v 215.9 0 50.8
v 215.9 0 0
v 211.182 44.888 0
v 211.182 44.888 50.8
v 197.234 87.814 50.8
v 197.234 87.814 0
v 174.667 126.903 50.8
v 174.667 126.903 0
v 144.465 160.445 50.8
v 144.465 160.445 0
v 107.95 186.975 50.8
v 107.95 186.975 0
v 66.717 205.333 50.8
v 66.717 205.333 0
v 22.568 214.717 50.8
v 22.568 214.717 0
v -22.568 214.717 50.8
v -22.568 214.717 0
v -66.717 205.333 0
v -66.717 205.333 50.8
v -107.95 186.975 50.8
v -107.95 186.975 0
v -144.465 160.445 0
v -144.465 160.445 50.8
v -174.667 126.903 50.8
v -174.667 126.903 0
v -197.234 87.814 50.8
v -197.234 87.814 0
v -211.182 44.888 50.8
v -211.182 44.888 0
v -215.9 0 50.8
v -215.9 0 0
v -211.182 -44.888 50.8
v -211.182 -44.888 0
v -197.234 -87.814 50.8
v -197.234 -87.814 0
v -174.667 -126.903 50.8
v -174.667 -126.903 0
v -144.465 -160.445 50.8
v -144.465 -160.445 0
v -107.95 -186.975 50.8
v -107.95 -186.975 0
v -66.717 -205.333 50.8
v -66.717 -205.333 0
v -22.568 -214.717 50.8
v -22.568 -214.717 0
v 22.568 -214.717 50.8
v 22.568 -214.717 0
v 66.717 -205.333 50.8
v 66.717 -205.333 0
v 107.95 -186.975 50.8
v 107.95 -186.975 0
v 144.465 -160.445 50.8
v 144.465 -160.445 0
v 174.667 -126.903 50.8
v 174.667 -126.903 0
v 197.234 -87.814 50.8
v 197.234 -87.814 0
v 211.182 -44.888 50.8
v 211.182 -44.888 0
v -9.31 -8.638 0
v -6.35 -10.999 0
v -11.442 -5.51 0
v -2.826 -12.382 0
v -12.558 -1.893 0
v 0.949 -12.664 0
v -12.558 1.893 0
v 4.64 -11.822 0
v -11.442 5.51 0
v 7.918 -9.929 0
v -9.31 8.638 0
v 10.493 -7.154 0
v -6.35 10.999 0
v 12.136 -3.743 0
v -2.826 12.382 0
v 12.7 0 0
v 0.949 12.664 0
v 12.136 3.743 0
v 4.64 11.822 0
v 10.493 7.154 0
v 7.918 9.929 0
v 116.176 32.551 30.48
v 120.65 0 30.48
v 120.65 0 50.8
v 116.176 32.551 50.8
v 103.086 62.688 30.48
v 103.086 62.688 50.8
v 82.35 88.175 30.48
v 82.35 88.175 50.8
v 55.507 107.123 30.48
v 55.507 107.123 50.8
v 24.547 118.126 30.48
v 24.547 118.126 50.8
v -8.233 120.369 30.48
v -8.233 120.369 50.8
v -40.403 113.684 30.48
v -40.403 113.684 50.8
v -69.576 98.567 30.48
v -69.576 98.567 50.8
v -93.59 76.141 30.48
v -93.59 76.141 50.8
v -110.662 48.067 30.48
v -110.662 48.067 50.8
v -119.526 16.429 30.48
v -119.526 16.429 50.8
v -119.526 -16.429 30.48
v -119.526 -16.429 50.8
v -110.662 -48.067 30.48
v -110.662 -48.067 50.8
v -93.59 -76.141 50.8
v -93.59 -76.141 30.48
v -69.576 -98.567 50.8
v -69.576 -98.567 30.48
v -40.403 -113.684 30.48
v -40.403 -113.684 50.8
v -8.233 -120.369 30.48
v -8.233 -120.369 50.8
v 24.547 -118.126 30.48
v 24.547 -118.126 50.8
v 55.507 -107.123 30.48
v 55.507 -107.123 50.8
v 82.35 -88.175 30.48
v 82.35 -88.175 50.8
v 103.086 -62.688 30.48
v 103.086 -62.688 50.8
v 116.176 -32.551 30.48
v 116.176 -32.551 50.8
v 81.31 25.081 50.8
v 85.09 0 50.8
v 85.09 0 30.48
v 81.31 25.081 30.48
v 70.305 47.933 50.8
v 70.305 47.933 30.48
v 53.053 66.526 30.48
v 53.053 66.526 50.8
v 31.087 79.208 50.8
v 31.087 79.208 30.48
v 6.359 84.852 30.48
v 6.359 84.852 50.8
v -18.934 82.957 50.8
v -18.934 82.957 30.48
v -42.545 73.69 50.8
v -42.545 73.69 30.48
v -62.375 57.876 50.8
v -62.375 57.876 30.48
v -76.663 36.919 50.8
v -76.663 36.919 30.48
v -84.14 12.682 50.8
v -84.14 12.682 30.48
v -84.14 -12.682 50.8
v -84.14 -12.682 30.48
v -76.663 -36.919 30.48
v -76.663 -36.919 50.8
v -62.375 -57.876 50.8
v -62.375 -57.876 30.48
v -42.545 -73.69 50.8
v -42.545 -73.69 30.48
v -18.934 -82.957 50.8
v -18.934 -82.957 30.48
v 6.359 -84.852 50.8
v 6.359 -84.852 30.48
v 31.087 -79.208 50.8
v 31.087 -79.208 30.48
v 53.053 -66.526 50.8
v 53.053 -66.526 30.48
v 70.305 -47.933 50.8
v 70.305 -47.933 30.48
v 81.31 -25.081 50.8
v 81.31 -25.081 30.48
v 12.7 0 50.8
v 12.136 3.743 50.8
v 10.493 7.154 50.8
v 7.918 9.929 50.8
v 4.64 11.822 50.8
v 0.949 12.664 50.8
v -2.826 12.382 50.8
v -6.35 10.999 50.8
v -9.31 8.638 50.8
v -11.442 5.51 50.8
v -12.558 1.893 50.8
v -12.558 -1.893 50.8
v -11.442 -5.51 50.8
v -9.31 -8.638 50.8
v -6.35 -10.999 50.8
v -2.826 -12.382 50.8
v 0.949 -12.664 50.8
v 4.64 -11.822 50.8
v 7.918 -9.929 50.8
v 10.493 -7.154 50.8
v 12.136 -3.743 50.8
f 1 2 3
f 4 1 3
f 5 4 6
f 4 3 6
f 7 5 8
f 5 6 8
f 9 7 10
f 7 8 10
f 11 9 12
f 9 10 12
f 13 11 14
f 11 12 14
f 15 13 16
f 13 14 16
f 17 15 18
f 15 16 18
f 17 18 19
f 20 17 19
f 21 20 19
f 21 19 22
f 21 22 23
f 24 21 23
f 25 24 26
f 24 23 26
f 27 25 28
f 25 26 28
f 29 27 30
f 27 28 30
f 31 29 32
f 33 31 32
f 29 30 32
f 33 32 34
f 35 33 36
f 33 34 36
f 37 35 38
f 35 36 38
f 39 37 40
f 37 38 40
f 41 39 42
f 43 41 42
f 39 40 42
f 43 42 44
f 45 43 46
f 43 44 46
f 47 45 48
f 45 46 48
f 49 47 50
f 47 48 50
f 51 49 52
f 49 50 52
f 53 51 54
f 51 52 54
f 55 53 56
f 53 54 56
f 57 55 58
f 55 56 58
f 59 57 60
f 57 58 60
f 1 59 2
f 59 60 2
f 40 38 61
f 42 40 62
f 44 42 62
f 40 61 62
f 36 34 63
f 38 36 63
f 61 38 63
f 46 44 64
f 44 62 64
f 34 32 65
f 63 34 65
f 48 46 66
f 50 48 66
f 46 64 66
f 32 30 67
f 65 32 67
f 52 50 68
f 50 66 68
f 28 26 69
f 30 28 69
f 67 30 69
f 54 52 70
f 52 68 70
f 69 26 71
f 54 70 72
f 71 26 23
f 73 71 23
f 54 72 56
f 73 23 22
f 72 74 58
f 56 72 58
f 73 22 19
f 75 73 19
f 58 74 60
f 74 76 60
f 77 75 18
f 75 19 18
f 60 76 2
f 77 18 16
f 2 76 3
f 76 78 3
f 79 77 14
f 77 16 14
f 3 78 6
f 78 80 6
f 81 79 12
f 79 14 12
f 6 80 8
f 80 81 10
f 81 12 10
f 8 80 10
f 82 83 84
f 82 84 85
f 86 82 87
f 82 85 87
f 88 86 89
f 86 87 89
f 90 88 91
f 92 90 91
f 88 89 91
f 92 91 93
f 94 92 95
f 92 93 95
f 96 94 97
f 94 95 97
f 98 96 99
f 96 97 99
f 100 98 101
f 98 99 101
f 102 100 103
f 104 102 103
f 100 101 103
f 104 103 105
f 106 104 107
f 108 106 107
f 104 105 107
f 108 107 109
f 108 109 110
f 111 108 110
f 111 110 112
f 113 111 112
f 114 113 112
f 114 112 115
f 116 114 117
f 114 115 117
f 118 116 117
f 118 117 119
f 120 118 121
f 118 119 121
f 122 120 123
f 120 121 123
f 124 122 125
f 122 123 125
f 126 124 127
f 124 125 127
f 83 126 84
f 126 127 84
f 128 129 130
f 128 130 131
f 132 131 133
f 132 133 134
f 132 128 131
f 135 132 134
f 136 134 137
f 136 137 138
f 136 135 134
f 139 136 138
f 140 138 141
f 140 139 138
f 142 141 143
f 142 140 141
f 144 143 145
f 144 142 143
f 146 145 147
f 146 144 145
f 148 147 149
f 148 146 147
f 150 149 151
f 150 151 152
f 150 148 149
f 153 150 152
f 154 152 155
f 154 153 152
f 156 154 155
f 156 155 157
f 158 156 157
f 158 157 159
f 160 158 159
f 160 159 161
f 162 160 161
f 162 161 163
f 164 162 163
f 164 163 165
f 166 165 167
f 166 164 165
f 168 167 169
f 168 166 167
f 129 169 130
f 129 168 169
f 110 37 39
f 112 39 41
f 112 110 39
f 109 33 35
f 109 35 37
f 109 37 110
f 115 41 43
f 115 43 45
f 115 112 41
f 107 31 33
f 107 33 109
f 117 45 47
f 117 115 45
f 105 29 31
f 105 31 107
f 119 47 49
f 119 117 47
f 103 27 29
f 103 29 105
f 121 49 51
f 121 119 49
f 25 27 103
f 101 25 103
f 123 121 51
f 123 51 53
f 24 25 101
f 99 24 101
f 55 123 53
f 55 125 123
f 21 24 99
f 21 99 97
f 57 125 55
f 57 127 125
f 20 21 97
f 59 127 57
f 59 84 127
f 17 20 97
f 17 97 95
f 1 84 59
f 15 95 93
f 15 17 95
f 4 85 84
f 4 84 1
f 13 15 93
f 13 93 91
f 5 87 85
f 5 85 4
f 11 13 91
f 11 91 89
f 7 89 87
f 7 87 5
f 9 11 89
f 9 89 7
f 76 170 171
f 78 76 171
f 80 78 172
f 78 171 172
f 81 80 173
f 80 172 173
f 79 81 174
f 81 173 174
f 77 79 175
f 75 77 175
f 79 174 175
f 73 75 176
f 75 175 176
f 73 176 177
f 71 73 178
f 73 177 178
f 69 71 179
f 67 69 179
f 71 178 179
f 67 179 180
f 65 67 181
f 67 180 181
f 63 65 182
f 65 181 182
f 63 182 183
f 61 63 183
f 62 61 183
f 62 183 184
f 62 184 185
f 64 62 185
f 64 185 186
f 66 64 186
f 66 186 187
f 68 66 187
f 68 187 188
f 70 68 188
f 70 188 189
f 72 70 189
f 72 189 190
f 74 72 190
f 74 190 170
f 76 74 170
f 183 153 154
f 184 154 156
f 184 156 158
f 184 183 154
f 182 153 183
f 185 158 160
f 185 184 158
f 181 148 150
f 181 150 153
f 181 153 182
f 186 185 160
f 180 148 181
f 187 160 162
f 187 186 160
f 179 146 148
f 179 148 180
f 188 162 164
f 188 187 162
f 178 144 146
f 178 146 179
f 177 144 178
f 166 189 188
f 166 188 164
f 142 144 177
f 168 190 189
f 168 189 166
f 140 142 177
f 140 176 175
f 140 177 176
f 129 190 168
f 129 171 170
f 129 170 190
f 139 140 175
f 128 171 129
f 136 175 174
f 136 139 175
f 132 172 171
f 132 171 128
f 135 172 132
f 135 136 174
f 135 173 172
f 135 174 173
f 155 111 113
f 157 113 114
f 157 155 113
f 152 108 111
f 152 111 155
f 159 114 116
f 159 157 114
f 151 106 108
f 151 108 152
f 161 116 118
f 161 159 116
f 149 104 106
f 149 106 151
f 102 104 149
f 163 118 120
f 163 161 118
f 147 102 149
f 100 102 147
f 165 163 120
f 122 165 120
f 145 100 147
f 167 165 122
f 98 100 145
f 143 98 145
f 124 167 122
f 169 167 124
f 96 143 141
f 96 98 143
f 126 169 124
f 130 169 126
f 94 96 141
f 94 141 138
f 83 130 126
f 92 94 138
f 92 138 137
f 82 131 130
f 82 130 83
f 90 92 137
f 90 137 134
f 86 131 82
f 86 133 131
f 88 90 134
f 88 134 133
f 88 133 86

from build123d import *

# Parameters (mm, degrees)
F0_R     = 215.9
F1_DEPTH = 50.8
F2_R     = 120.65
F2_R_2   = 85.09
F3_DEPTH = 20.32
F4_R     = 12.7
F5_DEPTH = 50.801


with BuildPart() as f1:
    # F0 (on Top) → F1 (new body)
    with BuildSketch(Plane.XY):
        Circle(F0_R)
    extrude(amount=F1_DEPTH)

    # F2 (on face) → F3 (cut)
    with BuildSketch(Plane.XY.offset(50.8)):
        Circle(F2_R)
        Circle(F2_R_2, mode=Mode.SUBTRACT)
    extrude(amount=-F3_DEPTH, mode=Mode.SUBTRACT)

    # F4 (on face) → F5 (cut, through all)
    with BuildSketch(Plane.XY.offset(50.8)):
        Circle(F4_R)
    extrude(amount=-F5_DEPTH, mode=Mode.SUBTRACT)


solid = f1.part
